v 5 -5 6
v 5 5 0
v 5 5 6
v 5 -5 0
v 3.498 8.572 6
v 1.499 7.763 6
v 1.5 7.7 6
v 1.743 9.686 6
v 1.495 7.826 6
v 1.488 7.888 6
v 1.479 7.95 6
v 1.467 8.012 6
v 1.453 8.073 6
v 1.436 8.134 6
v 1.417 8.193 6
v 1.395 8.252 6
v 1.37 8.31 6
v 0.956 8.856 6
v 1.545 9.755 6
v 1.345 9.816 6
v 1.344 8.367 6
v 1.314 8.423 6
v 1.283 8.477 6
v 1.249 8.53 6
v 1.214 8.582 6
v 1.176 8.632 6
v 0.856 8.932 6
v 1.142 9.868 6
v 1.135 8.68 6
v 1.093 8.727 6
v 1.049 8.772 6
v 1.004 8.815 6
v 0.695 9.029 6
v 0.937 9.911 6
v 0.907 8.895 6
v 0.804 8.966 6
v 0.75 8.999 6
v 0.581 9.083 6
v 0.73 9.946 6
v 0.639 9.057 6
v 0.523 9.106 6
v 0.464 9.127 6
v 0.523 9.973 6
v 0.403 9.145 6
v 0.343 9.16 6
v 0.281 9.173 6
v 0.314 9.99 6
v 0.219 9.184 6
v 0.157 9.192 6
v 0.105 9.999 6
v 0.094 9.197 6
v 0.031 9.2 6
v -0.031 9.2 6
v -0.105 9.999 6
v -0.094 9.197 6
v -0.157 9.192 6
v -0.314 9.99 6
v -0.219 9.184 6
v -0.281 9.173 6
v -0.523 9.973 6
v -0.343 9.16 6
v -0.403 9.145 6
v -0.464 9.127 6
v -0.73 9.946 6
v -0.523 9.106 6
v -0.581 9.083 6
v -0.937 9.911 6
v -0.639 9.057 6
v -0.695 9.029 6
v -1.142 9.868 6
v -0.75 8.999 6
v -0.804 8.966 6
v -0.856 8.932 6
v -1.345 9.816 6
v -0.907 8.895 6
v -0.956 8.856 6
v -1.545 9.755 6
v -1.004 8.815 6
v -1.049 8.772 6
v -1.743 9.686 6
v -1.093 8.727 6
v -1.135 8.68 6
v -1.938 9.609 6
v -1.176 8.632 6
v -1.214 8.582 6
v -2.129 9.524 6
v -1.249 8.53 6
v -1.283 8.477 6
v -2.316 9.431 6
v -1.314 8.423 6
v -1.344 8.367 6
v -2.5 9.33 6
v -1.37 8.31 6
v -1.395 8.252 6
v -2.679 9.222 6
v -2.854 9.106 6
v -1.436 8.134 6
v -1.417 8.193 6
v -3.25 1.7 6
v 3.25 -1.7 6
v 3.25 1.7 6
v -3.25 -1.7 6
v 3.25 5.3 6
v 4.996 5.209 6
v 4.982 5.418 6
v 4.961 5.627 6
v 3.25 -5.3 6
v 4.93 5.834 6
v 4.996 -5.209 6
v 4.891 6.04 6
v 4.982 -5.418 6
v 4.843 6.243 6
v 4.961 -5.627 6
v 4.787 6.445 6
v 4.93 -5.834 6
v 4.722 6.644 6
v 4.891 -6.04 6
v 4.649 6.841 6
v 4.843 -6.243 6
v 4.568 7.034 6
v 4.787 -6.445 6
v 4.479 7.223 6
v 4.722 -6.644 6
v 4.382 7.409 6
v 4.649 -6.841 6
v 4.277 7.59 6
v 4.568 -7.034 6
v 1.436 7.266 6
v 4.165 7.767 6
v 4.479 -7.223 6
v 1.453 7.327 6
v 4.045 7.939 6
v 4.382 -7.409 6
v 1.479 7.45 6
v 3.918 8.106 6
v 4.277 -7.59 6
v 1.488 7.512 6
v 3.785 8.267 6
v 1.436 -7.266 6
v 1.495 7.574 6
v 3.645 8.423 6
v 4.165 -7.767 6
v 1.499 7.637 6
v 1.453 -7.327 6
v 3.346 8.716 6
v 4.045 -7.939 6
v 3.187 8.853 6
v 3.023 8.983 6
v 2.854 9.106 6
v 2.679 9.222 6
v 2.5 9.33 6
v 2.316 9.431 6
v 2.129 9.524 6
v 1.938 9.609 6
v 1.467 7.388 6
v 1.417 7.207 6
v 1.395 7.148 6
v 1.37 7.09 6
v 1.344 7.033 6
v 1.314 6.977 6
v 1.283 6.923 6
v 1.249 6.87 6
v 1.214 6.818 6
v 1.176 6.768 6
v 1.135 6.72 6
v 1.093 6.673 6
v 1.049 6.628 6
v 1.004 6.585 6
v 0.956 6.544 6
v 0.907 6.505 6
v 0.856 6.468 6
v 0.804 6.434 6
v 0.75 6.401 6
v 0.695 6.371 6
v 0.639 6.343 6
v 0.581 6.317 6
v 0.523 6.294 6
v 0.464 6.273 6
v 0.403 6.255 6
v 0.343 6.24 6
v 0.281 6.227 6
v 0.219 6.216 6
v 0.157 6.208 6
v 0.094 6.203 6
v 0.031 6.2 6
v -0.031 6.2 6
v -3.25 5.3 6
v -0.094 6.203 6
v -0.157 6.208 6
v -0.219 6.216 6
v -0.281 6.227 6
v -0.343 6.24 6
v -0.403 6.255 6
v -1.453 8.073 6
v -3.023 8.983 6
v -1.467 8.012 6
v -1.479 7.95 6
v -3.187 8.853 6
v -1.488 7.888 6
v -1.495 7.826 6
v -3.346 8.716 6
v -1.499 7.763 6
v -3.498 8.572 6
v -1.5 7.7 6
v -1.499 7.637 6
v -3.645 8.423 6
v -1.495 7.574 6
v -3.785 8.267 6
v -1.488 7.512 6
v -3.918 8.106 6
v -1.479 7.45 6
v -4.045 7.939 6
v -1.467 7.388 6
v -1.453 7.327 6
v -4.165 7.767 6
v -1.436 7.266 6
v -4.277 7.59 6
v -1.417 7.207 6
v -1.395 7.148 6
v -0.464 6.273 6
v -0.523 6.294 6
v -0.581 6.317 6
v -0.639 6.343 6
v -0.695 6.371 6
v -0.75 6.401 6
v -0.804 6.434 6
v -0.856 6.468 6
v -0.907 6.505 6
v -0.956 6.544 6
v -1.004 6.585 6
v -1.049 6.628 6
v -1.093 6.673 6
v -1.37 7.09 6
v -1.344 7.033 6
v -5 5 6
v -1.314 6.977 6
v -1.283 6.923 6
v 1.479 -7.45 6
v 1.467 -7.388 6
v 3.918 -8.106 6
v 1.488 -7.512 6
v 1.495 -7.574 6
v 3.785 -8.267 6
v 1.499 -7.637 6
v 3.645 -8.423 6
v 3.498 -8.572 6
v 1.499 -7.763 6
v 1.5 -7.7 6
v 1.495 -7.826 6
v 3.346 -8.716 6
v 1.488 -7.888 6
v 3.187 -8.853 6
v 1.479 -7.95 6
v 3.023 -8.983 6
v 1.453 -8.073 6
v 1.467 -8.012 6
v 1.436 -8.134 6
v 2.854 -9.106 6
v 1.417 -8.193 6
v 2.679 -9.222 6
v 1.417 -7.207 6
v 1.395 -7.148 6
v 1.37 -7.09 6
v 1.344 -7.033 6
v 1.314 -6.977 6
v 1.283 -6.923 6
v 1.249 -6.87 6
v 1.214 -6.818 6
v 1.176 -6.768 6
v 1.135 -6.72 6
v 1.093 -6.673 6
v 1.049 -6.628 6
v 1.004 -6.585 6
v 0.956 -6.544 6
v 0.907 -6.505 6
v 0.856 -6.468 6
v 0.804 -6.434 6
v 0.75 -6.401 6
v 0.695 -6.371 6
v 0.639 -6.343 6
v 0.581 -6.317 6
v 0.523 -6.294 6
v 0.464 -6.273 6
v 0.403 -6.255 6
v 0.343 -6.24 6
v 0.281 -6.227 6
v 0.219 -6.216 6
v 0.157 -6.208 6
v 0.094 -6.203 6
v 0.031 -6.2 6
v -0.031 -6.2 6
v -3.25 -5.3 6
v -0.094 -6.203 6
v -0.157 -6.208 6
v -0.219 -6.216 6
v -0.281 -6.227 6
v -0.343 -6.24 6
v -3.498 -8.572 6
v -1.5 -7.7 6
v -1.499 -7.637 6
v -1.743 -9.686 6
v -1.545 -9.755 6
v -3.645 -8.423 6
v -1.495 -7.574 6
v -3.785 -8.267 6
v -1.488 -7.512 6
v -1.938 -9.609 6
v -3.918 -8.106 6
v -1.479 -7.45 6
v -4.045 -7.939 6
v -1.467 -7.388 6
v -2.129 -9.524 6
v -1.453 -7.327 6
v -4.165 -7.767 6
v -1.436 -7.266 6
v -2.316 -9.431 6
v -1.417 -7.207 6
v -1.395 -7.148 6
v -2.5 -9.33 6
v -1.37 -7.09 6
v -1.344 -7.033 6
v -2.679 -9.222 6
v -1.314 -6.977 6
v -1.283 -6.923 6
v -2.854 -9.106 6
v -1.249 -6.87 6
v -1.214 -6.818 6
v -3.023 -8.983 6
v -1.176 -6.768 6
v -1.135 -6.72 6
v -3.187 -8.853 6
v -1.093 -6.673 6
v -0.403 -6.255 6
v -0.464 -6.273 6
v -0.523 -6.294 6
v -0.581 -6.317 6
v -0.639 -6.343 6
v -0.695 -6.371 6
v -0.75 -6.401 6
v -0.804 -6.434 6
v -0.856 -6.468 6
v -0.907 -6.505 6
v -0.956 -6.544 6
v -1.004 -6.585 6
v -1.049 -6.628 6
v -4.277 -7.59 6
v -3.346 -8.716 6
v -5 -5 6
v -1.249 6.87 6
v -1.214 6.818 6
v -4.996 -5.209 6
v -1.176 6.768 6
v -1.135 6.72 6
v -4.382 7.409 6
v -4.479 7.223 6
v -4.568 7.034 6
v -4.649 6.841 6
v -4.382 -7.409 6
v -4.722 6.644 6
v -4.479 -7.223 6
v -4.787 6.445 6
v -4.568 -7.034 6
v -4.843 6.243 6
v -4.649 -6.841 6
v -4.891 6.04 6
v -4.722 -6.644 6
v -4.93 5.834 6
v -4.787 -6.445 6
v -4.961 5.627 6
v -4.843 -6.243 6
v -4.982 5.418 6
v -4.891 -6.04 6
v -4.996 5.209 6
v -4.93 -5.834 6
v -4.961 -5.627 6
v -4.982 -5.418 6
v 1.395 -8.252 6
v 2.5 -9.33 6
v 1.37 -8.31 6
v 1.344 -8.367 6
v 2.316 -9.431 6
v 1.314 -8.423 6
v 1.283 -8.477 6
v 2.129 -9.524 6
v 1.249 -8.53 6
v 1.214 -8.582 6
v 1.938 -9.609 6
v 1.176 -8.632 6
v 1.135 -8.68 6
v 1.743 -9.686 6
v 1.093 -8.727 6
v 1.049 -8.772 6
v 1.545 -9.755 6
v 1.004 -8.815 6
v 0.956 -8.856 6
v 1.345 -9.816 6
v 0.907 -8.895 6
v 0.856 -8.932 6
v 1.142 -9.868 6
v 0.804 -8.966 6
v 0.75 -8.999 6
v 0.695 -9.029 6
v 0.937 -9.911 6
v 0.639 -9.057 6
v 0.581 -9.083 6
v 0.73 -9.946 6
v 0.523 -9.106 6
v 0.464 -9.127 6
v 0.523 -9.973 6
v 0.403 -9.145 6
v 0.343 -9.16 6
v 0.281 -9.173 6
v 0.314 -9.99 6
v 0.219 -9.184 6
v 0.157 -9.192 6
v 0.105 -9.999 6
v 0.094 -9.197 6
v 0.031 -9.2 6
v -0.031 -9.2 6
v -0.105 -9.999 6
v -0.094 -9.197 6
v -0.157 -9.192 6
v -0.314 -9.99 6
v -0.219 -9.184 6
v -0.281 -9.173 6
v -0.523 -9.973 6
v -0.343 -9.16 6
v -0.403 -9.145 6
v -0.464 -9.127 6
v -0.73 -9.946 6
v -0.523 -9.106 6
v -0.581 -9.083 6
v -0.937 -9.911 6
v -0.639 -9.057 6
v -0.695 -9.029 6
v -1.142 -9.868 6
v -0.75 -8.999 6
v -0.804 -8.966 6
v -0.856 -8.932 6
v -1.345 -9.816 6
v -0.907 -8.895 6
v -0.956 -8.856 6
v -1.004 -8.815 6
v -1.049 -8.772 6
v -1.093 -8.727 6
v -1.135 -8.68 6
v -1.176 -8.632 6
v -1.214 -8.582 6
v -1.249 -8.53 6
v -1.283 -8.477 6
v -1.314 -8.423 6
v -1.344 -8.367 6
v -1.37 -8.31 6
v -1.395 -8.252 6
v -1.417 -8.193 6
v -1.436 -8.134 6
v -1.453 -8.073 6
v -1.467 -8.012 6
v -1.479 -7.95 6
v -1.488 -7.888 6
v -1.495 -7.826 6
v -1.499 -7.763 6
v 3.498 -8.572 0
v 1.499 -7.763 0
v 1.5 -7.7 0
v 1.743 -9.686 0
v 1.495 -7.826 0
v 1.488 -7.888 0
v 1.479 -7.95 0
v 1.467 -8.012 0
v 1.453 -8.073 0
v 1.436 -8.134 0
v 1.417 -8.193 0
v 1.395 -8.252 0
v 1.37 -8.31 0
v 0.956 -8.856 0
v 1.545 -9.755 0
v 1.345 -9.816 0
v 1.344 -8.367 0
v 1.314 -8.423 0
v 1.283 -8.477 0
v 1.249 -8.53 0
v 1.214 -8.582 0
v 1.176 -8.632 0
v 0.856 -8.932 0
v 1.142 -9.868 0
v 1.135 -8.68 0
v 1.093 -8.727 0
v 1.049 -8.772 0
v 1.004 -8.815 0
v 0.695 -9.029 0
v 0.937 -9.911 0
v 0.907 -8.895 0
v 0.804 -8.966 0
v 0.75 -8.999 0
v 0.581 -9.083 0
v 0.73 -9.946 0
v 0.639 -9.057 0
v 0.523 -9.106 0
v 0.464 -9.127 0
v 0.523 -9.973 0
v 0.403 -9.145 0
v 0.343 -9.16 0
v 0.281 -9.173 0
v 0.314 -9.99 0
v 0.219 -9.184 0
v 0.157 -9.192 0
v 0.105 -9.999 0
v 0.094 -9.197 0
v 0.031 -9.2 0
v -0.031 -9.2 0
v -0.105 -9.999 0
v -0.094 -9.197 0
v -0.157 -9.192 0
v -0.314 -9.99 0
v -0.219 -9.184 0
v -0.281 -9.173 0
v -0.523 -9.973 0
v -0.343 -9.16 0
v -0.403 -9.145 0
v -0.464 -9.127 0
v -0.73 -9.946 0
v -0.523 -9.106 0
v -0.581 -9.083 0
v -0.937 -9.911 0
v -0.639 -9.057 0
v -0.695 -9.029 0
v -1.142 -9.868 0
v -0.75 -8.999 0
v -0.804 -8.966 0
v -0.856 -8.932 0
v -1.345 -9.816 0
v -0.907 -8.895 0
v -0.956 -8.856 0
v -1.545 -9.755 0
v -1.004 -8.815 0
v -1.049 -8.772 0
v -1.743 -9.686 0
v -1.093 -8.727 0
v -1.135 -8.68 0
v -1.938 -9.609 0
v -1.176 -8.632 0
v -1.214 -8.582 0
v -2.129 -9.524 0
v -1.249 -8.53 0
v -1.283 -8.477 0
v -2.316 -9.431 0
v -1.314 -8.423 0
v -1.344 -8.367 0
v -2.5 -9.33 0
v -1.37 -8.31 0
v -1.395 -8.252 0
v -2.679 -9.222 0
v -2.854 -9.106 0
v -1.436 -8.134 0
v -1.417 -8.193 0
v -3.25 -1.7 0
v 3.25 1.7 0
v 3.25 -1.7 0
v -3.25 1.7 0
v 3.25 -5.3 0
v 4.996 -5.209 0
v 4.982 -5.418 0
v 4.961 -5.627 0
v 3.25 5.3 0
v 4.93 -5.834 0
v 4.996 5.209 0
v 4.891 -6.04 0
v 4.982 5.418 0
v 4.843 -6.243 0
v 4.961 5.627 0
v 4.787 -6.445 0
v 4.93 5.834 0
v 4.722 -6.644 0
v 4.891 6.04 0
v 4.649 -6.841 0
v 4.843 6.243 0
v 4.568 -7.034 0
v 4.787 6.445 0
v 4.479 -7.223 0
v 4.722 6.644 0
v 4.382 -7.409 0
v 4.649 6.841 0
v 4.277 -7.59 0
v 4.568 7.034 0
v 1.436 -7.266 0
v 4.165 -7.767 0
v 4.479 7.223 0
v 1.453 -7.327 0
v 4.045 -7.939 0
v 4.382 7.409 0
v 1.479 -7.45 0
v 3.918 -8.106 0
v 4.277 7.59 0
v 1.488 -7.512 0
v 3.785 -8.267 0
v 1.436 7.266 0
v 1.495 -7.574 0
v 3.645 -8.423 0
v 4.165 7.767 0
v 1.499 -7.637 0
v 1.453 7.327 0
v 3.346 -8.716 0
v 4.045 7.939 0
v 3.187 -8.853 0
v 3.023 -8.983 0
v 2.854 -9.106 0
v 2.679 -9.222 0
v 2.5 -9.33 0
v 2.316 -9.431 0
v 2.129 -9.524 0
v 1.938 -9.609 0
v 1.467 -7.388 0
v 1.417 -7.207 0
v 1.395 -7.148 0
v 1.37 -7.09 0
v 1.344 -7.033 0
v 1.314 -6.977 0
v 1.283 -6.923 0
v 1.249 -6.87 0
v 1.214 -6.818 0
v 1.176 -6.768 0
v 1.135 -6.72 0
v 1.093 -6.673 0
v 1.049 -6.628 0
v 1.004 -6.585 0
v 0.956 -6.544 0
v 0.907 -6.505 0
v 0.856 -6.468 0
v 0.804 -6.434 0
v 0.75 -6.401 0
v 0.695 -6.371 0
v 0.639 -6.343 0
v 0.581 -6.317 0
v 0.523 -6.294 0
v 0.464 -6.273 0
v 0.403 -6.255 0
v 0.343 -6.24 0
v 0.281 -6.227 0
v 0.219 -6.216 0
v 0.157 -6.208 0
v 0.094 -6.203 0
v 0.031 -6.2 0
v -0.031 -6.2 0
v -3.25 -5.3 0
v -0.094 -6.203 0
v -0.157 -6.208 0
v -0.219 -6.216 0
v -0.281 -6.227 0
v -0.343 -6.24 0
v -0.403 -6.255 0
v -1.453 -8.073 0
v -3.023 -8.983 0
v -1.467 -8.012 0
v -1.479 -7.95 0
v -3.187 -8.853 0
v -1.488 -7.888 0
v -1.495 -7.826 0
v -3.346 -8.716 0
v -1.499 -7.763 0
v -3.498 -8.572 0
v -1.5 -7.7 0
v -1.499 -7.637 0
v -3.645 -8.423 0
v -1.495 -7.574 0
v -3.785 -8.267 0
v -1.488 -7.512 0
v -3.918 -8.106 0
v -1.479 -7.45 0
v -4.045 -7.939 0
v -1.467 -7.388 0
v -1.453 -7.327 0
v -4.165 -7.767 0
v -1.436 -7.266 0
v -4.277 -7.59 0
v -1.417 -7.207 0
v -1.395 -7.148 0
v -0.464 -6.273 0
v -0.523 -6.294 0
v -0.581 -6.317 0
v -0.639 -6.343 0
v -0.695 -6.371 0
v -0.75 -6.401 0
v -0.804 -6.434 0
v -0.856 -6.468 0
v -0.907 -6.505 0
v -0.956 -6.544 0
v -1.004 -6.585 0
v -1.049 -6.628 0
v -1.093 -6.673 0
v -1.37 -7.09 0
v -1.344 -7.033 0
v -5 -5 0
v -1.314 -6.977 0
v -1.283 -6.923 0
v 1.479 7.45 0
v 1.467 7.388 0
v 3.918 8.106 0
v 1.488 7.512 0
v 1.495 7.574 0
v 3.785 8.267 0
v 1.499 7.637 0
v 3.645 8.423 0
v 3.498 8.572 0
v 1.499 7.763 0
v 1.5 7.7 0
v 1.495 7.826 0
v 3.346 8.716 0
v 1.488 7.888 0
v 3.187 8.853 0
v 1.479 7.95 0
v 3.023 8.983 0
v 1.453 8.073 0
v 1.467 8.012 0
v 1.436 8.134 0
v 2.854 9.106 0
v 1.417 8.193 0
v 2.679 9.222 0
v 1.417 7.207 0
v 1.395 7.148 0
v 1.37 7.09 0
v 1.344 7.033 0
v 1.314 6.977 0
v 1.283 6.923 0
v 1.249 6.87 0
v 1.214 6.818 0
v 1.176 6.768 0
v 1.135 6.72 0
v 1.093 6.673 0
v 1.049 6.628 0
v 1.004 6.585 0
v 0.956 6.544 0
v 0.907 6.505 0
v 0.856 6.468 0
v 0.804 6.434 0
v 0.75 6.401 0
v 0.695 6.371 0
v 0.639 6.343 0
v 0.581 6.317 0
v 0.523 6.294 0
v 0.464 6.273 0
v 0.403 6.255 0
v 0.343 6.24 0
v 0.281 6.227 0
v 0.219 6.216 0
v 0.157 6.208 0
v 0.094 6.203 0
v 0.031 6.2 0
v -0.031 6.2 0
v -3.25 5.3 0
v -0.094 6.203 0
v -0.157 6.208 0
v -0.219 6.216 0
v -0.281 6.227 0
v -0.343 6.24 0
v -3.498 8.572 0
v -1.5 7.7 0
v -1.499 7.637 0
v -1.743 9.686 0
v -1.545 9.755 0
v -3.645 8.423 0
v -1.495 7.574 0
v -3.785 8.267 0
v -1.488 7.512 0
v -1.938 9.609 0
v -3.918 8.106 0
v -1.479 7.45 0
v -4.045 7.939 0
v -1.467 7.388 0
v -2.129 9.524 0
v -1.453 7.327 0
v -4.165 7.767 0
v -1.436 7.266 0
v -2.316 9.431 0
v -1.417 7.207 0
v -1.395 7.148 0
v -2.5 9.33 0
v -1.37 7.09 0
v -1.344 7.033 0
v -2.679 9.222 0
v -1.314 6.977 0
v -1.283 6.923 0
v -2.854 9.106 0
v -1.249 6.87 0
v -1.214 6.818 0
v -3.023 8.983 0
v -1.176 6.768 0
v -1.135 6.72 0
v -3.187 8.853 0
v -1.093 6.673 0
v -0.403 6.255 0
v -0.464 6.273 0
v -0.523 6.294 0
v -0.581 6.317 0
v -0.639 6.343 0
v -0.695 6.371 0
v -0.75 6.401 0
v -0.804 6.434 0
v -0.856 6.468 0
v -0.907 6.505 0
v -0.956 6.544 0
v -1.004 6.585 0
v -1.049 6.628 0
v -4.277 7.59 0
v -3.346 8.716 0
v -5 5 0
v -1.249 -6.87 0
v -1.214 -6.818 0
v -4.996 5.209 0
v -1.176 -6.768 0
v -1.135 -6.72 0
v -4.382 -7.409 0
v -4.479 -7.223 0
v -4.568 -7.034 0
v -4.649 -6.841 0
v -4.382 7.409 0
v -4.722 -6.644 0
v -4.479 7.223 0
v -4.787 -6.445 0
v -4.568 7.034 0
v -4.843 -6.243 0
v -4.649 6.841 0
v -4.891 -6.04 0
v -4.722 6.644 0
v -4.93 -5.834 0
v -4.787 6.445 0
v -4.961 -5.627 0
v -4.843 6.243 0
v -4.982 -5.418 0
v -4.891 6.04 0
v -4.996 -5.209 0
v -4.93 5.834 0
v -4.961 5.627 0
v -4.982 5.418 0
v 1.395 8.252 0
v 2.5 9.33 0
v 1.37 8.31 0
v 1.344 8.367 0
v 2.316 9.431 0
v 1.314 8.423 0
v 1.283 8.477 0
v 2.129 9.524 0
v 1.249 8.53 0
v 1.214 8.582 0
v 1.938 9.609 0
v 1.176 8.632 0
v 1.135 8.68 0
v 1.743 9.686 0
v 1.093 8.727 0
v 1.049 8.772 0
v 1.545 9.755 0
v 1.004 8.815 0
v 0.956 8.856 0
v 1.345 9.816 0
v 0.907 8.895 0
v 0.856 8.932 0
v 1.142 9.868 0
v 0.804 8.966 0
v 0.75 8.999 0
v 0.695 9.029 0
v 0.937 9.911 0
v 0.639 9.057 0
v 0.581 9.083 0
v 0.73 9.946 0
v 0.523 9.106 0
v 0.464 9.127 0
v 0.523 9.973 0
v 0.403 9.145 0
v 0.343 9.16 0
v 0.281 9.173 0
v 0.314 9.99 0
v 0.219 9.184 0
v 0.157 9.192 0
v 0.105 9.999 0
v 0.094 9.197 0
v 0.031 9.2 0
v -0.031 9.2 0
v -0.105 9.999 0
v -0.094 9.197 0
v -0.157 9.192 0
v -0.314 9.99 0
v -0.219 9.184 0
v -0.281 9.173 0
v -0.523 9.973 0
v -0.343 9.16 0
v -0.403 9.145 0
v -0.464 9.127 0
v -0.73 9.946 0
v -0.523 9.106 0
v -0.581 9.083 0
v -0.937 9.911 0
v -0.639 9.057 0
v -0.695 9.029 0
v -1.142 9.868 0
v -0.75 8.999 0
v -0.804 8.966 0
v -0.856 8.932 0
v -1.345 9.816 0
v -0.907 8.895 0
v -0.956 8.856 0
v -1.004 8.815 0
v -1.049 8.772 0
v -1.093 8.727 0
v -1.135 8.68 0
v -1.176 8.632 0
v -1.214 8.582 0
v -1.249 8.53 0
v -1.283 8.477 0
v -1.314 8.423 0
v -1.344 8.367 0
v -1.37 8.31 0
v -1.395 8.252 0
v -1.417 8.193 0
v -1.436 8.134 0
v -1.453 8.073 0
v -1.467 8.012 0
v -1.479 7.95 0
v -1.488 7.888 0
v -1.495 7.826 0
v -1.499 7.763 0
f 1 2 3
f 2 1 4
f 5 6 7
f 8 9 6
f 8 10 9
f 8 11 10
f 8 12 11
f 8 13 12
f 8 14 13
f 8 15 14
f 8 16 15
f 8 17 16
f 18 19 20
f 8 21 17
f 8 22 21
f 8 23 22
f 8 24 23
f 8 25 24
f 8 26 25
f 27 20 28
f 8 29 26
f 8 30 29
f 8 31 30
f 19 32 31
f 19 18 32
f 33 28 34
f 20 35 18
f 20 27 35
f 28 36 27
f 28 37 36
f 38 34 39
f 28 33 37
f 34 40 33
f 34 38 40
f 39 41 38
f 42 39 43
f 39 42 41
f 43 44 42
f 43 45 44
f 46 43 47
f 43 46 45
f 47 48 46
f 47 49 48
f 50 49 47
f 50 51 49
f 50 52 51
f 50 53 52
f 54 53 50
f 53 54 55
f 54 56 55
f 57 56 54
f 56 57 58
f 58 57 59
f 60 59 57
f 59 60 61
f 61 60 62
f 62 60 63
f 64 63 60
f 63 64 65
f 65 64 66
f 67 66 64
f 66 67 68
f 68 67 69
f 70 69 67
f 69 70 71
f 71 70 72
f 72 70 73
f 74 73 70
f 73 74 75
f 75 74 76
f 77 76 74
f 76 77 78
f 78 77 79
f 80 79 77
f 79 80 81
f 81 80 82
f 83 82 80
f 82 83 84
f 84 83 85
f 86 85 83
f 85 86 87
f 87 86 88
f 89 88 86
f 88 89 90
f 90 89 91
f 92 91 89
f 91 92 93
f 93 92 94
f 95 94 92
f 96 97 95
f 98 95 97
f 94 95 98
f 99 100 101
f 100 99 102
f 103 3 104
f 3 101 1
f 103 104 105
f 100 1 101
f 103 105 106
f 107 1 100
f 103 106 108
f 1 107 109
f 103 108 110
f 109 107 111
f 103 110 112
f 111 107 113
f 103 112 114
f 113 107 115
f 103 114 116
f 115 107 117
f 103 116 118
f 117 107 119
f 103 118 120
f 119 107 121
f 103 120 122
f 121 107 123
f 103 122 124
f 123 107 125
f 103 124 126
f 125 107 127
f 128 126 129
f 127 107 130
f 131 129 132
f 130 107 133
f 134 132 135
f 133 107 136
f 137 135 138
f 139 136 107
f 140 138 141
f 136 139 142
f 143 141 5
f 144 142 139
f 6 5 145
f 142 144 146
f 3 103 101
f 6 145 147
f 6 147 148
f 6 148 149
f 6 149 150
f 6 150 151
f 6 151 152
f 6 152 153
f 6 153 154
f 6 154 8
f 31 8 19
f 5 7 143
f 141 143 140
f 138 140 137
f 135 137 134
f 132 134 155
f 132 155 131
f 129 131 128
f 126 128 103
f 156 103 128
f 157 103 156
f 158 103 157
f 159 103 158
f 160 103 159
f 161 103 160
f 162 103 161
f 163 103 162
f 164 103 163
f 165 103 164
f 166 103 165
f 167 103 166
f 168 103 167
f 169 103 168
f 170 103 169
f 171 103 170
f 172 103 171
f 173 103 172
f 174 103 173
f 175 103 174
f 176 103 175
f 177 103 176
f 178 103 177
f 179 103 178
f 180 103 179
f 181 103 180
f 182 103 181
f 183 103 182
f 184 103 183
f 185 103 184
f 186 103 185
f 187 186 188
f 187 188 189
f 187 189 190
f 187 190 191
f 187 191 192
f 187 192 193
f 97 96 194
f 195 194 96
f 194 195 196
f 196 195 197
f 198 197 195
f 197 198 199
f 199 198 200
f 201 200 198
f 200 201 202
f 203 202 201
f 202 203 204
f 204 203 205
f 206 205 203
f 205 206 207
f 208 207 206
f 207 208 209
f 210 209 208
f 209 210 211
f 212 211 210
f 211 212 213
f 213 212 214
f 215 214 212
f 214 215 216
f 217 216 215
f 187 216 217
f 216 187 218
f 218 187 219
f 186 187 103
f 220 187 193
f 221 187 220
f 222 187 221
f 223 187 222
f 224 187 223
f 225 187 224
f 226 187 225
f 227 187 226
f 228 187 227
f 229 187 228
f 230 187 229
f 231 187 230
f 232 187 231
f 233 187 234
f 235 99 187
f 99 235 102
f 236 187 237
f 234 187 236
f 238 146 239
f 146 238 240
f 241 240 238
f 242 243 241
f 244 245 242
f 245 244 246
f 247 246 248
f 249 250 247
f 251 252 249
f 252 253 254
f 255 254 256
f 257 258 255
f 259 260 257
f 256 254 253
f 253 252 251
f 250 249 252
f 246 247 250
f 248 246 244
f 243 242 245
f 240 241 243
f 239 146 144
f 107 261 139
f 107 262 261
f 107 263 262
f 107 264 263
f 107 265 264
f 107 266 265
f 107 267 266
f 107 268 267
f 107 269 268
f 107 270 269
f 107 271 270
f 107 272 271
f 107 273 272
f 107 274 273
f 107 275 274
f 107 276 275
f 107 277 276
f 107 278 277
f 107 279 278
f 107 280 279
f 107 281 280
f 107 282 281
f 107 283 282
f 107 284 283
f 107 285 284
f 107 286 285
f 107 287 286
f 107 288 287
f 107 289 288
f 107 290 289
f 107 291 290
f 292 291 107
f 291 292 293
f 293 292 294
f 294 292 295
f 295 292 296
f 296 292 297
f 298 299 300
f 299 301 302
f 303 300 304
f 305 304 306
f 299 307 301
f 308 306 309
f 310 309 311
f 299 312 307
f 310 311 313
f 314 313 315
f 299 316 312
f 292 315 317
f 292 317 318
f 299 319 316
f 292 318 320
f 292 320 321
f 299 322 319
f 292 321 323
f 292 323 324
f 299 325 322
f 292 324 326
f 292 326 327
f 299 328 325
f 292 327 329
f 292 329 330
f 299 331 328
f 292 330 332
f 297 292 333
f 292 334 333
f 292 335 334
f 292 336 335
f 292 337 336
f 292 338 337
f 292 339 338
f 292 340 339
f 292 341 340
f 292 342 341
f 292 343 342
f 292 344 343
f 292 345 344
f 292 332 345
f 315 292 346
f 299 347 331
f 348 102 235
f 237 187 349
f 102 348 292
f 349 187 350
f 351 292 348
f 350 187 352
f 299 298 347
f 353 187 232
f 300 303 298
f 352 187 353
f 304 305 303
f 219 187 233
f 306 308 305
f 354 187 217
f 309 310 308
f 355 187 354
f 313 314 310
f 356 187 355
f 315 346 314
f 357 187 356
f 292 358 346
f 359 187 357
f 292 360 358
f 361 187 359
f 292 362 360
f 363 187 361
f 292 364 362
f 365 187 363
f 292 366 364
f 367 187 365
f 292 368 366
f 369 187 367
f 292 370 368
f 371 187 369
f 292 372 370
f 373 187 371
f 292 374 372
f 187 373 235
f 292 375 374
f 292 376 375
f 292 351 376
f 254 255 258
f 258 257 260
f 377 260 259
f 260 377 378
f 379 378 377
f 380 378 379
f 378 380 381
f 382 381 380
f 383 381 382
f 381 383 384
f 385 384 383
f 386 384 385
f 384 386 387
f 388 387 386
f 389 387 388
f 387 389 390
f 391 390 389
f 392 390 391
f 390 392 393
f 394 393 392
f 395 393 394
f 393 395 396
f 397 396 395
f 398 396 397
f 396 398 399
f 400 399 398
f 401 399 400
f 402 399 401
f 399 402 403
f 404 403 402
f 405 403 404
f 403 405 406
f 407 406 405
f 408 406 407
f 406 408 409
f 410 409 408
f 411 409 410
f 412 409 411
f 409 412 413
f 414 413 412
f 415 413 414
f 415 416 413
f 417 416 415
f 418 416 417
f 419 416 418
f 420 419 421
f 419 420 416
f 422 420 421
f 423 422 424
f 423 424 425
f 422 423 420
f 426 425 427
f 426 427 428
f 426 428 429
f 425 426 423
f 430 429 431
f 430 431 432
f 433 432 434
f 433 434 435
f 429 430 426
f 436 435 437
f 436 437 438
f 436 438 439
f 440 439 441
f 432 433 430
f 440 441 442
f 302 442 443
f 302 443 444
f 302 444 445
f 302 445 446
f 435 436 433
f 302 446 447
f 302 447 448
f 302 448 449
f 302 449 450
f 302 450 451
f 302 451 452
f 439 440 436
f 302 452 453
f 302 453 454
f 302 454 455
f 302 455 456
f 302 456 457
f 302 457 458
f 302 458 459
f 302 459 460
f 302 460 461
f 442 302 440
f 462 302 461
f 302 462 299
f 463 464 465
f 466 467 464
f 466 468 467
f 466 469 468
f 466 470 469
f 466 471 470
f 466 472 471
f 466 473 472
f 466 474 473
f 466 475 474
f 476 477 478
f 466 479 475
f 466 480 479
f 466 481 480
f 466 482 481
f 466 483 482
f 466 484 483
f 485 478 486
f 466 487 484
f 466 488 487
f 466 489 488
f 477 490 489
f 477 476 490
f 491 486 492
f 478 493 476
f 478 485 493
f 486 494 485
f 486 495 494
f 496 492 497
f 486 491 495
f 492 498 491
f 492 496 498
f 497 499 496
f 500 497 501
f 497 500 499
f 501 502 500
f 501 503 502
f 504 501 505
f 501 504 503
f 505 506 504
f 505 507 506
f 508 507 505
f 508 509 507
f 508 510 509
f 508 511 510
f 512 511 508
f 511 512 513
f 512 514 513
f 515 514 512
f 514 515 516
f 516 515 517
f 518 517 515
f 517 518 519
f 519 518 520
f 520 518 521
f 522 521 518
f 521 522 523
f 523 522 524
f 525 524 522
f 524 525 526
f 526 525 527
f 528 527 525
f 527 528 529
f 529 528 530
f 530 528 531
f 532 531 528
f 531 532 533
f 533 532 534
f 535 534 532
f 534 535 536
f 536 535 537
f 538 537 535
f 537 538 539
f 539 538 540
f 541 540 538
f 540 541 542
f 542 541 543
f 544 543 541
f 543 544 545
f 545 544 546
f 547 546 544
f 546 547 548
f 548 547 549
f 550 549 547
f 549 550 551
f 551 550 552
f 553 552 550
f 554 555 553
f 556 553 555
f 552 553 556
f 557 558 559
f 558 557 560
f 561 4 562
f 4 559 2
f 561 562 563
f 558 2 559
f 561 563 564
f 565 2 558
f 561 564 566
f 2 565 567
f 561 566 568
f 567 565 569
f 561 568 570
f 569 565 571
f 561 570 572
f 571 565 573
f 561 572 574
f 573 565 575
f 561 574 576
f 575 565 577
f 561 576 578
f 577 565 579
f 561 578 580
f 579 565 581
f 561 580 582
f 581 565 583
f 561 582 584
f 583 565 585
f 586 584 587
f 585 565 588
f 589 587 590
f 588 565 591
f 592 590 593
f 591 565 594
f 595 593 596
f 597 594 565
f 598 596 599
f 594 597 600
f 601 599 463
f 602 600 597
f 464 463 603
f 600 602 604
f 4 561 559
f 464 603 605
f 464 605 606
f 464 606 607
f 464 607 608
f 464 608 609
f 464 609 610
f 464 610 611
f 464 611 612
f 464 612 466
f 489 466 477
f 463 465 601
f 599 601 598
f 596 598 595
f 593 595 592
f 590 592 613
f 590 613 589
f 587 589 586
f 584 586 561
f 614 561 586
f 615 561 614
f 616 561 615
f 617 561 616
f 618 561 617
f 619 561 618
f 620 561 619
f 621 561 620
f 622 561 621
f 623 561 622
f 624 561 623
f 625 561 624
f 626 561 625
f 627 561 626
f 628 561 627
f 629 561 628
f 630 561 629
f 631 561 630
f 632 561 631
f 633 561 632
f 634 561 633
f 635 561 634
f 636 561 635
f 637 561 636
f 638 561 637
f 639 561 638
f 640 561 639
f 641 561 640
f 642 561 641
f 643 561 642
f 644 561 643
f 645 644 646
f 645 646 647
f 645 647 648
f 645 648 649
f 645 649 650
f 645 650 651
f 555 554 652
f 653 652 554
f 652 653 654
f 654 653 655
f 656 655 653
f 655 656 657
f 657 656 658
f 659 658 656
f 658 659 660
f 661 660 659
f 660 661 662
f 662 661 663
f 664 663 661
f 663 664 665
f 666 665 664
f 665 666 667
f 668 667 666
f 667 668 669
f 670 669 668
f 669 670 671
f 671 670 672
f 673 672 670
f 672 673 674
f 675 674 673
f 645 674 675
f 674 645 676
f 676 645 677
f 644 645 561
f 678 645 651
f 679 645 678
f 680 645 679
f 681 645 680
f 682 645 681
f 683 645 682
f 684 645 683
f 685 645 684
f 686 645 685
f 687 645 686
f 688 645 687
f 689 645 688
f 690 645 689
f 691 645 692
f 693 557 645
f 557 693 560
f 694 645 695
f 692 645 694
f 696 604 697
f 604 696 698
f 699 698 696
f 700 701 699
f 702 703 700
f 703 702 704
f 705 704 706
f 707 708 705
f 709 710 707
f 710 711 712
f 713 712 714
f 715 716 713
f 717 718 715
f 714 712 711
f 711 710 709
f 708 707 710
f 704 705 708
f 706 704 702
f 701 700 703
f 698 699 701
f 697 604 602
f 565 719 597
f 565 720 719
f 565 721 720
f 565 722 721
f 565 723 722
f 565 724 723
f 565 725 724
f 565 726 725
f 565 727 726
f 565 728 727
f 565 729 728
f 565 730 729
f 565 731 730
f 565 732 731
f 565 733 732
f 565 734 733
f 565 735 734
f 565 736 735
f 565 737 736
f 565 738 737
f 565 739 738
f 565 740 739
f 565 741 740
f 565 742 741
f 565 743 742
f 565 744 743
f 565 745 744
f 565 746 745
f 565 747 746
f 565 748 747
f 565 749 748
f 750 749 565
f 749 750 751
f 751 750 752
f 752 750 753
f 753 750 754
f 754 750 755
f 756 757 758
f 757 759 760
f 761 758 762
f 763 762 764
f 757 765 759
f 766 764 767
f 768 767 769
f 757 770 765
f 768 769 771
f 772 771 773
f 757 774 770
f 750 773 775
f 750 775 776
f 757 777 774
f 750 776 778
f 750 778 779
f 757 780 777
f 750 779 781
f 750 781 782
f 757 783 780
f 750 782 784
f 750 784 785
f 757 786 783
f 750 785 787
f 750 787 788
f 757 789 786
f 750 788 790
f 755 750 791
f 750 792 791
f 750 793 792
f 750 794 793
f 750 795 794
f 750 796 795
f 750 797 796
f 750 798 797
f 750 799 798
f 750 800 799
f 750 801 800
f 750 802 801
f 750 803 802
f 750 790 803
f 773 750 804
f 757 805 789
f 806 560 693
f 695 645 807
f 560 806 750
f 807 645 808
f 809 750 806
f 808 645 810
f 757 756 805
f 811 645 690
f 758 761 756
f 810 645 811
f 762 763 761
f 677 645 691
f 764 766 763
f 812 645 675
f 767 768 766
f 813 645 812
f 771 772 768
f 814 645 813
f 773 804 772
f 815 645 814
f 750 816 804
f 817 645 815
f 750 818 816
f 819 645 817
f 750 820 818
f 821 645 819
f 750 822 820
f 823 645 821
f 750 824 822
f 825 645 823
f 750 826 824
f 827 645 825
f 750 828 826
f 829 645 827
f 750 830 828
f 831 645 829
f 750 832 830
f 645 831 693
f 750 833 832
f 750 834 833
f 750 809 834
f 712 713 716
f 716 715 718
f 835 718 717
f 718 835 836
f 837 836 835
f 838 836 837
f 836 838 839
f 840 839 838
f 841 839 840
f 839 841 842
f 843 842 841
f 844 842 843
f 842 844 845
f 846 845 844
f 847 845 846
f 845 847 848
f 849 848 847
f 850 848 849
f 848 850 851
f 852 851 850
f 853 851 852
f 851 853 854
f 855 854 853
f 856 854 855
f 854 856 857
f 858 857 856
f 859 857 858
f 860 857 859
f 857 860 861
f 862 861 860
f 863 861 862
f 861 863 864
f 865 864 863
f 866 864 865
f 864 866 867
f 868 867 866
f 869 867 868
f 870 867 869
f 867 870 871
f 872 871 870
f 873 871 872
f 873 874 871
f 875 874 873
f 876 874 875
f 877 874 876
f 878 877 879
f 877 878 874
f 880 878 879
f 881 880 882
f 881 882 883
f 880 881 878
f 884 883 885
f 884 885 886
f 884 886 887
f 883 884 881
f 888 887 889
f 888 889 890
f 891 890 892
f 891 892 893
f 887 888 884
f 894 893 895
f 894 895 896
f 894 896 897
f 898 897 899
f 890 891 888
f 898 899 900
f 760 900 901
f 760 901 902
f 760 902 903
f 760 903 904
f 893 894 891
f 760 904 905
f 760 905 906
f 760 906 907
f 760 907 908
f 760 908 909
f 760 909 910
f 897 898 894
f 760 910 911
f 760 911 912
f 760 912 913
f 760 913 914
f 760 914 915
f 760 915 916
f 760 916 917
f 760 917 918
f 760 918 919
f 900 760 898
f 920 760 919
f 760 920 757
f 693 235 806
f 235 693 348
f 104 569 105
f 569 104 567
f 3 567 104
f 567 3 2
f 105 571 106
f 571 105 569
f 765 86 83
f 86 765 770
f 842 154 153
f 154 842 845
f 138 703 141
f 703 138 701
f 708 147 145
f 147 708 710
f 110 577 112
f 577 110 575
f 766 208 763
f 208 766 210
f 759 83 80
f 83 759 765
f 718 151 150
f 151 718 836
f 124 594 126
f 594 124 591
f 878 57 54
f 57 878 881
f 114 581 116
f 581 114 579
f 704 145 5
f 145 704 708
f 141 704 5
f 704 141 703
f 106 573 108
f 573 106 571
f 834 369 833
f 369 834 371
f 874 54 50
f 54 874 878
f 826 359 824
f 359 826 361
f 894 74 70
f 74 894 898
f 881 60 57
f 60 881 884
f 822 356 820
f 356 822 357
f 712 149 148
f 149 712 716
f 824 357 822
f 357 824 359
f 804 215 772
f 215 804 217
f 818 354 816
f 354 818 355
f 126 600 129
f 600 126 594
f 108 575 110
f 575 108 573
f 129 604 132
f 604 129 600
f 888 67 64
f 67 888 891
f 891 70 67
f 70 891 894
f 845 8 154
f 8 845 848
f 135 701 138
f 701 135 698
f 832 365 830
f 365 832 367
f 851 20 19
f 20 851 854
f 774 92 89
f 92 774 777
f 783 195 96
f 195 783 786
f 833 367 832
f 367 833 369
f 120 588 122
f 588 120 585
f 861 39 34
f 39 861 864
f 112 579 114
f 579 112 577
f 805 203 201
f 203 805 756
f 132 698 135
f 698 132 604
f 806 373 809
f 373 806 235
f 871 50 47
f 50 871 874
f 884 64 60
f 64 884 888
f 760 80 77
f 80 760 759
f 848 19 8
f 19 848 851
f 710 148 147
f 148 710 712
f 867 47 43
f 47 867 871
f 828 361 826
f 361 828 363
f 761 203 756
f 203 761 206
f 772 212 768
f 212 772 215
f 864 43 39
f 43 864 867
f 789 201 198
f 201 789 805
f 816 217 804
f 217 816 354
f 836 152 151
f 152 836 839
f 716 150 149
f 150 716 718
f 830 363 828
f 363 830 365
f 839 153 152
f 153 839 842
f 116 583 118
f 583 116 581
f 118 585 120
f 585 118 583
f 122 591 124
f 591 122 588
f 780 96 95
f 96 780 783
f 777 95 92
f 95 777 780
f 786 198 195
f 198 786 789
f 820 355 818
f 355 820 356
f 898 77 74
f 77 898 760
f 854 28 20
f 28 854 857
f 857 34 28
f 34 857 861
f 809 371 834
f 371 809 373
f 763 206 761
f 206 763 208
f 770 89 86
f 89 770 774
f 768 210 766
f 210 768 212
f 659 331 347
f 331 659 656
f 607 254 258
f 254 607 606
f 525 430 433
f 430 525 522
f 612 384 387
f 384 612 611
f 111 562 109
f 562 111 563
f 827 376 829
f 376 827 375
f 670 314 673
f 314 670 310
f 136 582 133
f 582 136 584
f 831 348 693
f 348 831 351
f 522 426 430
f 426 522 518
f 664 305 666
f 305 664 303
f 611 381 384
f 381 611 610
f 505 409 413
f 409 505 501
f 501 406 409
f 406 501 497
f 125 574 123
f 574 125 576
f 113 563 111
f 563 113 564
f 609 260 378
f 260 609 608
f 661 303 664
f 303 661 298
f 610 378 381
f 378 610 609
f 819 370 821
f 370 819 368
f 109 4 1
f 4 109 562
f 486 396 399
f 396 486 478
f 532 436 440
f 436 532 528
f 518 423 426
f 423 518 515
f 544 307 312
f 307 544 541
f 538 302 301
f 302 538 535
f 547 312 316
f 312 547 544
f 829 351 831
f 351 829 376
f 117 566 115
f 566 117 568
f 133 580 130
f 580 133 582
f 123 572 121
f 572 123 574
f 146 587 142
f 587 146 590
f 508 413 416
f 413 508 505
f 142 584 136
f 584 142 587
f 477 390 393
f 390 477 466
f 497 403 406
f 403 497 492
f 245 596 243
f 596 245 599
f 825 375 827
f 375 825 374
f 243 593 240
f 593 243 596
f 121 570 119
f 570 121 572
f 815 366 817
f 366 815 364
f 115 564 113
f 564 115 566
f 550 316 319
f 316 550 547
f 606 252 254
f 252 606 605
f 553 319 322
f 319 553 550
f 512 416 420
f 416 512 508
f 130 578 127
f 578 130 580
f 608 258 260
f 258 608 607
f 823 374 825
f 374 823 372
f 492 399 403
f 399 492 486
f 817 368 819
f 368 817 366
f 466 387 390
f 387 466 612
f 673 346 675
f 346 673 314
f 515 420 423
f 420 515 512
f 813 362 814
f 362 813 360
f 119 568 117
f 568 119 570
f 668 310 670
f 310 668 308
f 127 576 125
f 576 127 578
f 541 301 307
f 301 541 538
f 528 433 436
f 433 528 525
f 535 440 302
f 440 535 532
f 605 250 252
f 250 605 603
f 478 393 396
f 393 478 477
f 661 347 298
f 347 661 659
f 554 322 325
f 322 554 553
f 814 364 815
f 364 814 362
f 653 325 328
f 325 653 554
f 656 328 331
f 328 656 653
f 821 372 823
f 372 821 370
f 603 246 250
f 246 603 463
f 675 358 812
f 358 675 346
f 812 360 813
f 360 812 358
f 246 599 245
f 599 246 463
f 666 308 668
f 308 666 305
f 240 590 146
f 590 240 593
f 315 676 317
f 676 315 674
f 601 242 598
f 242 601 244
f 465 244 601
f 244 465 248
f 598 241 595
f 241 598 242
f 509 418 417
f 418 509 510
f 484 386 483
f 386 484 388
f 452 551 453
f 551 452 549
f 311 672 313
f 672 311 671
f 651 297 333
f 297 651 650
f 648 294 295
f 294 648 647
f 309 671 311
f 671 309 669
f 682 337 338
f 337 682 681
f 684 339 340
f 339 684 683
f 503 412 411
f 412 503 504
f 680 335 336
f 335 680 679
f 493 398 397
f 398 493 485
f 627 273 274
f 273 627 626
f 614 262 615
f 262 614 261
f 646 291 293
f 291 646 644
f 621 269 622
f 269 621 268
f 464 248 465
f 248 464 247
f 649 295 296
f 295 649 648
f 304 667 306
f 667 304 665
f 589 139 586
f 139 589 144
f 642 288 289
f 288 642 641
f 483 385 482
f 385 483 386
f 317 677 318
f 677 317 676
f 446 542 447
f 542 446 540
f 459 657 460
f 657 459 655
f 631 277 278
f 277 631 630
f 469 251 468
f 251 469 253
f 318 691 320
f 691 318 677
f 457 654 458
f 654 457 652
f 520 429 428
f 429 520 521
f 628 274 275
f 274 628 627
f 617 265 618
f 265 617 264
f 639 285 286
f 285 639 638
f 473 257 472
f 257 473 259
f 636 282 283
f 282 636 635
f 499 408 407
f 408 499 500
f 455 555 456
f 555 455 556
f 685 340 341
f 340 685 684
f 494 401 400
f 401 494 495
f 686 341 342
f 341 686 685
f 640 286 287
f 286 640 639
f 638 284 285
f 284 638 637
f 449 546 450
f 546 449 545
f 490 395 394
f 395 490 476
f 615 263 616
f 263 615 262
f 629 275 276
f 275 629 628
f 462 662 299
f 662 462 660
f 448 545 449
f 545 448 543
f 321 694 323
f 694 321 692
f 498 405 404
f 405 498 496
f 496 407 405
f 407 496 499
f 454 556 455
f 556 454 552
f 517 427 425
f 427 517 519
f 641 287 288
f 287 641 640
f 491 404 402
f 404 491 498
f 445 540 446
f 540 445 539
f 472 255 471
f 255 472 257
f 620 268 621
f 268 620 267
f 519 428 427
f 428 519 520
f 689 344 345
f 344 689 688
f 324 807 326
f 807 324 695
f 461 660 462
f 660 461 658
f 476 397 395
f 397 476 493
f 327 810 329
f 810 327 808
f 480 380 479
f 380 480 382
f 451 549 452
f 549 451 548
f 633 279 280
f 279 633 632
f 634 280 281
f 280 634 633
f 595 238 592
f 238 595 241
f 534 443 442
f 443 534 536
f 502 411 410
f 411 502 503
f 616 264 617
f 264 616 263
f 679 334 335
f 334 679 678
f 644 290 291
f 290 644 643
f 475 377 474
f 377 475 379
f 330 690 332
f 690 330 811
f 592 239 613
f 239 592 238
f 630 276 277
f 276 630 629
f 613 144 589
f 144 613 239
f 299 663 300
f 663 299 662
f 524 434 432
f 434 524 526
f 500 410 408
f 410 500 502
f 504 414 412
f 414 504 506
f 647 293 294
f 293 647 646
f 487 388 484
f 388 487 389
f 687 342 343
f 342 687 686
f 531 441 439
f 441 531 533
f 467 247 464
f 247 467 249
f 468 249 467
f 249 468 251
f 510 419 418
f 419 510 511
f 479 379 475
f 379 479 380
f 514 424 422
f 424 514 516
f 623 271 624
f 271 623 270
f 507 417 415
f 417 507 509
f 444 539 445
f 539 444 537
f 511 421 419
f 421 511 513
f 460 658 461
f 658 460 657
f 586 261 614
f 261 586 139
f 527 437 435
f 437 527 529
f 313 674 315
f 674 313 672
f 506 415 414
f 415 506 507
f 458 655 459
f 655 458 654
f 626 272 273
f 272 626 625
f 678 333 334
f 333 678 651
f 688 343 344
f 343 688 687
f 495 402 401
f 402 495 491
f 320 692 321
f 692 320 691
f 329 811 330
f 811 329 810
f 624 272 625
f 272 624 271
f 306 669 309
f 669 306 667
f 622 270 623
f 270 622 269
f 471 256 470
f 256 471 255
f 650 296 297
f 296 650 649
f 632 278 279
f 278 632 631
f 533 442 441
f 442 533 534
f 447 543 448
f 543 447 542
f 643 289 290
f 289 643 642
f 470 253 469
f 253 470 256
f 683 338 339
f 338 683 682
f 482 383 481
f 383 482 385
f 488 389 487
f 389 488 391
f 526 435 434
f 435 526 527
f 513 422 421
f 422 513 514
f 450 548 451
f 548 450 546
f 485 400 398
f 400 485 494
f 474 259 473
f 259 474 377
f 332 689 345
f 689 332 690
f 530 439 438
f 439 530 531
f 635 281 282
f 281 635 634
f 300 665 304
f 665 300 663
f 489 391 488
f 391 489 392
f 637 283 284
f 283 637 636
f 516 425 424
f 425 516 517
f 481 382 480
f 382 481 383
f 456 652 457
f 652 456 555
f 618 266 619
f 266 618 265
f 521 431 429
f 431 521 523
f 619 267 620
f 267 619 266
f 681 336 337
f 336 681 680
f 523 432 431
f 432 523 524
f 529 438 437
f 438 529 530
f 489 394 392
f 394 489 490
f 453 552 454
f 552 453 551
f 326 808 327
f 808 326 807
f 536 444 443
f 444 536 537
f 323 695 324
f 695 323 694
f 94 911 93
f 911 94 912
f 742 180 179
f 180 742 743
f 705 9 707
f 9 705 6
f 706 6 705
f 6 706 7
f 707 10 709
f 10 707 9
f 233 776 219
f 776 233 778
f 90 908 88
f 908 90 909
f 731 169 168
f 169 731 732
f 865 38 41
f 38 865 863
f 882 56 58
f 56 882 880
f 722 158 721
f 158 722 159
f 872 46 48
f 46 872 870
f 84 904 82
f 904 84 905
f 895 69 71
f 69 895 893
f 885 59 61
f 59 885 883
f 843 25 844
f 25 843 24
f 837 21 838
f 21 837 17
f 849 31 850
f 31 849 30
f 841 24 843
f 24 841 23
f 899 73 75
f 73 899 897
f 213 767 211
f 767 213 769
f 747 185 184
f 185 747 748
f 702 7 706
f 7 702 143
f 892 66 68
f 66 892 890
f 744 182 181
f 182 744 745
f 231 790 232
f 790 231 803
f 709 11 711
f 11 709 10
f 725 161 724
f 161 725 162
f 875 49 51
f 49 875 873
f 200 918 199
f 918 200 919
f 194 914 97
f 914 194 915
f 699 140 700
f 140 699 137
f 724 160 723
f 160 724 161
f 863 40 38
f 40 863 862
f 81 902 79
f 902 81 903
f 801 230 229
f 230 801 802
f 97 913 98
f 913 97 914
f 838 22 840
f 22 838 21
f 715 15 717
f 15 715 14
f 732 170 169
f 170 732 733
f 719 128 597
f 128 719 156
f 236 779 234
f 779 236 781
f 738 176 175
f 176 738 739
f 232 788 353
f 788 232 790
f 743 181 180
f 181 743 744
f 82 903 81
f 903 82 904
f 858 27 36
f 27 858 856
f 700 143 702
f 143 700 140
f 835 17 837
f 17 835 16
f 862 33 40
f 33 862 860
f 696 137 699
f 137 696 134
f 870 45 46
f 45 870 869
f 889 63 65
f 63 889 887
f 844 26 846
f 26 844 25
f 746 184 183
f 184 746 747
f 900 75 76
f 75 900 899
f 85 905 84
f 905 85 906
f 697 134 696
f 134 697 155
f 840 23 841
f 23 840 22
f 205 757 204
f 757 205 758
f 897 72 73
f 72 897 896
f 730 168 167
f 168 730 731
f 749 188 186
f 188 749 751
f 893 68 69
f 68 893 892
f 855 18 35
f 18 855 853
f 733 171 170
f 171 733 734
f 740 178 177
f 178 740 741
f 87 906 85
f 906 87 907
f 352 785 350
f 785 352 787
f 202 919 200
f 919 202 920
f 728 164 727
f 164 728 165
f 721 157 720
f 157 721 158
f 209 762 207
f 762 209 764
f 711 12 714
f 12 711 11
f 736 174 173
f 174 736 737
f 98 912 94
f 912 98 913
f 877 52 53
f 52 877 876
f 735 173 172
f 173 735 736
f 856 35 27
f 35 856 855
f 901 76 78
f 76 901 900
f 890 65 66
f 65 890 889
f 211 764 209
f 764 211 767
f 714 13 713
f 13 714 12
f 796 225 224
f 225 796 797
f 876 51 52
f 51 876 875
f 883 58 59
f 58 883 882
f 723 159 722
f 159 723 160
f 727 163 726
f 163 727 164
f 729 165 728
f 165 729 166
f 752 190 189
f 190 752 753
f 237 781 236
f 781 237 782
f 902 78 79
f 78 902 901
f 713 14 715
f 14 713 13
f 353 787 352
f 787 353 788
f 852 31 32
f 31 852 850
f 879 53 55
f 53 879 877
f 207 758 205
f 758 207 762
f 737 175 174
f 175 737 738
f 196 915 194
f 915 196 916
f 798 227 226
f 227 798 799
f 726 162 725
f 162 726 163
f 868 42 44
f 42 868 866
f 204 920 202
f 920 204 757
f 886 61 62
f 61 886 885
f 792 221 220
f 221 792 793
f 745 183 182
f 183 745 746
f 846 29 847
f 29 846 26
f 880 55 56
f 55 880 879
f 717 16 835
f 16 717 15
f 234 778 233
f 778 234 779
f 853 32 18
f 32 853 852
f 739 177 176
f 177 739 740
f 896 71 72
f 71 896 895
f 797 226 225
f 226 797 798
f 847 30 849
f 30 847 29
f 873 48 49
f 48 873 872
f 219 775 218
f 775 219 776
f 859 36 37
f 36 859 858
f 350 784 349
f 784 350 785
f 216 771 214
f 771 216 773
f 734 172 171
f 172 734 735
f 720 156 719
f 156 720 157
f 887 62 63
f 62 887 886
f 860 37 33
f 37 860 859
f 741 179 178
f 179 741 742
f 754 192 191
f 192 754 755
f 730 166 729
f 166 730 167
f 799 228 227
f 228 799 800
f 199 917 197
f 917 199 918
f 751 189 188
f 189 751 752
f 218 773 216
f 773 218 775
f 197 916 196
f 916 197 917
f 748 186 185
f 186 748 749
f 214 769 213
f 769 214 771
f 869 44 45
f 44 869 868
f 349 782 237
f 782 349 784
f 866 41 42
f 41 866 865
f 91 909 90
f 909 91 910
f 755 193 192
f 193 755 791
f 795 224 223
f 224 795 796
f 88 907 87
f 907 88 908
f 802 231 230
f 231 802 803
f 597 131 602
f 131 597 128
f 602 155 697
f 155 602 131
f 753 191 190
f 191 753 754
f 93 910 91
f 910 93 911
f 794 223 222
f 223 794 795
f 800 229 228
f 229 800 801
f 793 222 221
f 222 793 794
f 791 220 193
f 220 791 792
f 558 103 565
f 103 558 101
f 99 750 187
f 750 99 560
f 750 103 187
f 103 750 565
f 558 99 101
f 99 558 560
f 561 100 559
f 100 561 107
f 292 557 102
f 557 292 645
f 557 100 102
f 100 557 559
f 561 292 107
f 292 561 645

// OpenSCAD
difference(){
union(){
translate([0,0,3]){

cube([10,10,6],center=true);}


translate([0,5,3]){
cylinder(h=6, r=5,$fn=150, center=true);}
    
   translate([0,-5,3]){
cylinder(h=6, r=5,$fn=150, center=true);} 
    
}
translate([0,-7.7,3]){
cylinder(h=6.3, r=1.5,$fn=150, center=true);}

translate([0,7.7,3]){

cylinder(h=6.3, r=1.5,$fn=150, center=true);}

translate([0,3.5,3]){

cube([6.5,3.6,6.1],center=true);}

translate([0,-3.5,3]){

cube([6.5,3.6,6.1],center=true);}
}
